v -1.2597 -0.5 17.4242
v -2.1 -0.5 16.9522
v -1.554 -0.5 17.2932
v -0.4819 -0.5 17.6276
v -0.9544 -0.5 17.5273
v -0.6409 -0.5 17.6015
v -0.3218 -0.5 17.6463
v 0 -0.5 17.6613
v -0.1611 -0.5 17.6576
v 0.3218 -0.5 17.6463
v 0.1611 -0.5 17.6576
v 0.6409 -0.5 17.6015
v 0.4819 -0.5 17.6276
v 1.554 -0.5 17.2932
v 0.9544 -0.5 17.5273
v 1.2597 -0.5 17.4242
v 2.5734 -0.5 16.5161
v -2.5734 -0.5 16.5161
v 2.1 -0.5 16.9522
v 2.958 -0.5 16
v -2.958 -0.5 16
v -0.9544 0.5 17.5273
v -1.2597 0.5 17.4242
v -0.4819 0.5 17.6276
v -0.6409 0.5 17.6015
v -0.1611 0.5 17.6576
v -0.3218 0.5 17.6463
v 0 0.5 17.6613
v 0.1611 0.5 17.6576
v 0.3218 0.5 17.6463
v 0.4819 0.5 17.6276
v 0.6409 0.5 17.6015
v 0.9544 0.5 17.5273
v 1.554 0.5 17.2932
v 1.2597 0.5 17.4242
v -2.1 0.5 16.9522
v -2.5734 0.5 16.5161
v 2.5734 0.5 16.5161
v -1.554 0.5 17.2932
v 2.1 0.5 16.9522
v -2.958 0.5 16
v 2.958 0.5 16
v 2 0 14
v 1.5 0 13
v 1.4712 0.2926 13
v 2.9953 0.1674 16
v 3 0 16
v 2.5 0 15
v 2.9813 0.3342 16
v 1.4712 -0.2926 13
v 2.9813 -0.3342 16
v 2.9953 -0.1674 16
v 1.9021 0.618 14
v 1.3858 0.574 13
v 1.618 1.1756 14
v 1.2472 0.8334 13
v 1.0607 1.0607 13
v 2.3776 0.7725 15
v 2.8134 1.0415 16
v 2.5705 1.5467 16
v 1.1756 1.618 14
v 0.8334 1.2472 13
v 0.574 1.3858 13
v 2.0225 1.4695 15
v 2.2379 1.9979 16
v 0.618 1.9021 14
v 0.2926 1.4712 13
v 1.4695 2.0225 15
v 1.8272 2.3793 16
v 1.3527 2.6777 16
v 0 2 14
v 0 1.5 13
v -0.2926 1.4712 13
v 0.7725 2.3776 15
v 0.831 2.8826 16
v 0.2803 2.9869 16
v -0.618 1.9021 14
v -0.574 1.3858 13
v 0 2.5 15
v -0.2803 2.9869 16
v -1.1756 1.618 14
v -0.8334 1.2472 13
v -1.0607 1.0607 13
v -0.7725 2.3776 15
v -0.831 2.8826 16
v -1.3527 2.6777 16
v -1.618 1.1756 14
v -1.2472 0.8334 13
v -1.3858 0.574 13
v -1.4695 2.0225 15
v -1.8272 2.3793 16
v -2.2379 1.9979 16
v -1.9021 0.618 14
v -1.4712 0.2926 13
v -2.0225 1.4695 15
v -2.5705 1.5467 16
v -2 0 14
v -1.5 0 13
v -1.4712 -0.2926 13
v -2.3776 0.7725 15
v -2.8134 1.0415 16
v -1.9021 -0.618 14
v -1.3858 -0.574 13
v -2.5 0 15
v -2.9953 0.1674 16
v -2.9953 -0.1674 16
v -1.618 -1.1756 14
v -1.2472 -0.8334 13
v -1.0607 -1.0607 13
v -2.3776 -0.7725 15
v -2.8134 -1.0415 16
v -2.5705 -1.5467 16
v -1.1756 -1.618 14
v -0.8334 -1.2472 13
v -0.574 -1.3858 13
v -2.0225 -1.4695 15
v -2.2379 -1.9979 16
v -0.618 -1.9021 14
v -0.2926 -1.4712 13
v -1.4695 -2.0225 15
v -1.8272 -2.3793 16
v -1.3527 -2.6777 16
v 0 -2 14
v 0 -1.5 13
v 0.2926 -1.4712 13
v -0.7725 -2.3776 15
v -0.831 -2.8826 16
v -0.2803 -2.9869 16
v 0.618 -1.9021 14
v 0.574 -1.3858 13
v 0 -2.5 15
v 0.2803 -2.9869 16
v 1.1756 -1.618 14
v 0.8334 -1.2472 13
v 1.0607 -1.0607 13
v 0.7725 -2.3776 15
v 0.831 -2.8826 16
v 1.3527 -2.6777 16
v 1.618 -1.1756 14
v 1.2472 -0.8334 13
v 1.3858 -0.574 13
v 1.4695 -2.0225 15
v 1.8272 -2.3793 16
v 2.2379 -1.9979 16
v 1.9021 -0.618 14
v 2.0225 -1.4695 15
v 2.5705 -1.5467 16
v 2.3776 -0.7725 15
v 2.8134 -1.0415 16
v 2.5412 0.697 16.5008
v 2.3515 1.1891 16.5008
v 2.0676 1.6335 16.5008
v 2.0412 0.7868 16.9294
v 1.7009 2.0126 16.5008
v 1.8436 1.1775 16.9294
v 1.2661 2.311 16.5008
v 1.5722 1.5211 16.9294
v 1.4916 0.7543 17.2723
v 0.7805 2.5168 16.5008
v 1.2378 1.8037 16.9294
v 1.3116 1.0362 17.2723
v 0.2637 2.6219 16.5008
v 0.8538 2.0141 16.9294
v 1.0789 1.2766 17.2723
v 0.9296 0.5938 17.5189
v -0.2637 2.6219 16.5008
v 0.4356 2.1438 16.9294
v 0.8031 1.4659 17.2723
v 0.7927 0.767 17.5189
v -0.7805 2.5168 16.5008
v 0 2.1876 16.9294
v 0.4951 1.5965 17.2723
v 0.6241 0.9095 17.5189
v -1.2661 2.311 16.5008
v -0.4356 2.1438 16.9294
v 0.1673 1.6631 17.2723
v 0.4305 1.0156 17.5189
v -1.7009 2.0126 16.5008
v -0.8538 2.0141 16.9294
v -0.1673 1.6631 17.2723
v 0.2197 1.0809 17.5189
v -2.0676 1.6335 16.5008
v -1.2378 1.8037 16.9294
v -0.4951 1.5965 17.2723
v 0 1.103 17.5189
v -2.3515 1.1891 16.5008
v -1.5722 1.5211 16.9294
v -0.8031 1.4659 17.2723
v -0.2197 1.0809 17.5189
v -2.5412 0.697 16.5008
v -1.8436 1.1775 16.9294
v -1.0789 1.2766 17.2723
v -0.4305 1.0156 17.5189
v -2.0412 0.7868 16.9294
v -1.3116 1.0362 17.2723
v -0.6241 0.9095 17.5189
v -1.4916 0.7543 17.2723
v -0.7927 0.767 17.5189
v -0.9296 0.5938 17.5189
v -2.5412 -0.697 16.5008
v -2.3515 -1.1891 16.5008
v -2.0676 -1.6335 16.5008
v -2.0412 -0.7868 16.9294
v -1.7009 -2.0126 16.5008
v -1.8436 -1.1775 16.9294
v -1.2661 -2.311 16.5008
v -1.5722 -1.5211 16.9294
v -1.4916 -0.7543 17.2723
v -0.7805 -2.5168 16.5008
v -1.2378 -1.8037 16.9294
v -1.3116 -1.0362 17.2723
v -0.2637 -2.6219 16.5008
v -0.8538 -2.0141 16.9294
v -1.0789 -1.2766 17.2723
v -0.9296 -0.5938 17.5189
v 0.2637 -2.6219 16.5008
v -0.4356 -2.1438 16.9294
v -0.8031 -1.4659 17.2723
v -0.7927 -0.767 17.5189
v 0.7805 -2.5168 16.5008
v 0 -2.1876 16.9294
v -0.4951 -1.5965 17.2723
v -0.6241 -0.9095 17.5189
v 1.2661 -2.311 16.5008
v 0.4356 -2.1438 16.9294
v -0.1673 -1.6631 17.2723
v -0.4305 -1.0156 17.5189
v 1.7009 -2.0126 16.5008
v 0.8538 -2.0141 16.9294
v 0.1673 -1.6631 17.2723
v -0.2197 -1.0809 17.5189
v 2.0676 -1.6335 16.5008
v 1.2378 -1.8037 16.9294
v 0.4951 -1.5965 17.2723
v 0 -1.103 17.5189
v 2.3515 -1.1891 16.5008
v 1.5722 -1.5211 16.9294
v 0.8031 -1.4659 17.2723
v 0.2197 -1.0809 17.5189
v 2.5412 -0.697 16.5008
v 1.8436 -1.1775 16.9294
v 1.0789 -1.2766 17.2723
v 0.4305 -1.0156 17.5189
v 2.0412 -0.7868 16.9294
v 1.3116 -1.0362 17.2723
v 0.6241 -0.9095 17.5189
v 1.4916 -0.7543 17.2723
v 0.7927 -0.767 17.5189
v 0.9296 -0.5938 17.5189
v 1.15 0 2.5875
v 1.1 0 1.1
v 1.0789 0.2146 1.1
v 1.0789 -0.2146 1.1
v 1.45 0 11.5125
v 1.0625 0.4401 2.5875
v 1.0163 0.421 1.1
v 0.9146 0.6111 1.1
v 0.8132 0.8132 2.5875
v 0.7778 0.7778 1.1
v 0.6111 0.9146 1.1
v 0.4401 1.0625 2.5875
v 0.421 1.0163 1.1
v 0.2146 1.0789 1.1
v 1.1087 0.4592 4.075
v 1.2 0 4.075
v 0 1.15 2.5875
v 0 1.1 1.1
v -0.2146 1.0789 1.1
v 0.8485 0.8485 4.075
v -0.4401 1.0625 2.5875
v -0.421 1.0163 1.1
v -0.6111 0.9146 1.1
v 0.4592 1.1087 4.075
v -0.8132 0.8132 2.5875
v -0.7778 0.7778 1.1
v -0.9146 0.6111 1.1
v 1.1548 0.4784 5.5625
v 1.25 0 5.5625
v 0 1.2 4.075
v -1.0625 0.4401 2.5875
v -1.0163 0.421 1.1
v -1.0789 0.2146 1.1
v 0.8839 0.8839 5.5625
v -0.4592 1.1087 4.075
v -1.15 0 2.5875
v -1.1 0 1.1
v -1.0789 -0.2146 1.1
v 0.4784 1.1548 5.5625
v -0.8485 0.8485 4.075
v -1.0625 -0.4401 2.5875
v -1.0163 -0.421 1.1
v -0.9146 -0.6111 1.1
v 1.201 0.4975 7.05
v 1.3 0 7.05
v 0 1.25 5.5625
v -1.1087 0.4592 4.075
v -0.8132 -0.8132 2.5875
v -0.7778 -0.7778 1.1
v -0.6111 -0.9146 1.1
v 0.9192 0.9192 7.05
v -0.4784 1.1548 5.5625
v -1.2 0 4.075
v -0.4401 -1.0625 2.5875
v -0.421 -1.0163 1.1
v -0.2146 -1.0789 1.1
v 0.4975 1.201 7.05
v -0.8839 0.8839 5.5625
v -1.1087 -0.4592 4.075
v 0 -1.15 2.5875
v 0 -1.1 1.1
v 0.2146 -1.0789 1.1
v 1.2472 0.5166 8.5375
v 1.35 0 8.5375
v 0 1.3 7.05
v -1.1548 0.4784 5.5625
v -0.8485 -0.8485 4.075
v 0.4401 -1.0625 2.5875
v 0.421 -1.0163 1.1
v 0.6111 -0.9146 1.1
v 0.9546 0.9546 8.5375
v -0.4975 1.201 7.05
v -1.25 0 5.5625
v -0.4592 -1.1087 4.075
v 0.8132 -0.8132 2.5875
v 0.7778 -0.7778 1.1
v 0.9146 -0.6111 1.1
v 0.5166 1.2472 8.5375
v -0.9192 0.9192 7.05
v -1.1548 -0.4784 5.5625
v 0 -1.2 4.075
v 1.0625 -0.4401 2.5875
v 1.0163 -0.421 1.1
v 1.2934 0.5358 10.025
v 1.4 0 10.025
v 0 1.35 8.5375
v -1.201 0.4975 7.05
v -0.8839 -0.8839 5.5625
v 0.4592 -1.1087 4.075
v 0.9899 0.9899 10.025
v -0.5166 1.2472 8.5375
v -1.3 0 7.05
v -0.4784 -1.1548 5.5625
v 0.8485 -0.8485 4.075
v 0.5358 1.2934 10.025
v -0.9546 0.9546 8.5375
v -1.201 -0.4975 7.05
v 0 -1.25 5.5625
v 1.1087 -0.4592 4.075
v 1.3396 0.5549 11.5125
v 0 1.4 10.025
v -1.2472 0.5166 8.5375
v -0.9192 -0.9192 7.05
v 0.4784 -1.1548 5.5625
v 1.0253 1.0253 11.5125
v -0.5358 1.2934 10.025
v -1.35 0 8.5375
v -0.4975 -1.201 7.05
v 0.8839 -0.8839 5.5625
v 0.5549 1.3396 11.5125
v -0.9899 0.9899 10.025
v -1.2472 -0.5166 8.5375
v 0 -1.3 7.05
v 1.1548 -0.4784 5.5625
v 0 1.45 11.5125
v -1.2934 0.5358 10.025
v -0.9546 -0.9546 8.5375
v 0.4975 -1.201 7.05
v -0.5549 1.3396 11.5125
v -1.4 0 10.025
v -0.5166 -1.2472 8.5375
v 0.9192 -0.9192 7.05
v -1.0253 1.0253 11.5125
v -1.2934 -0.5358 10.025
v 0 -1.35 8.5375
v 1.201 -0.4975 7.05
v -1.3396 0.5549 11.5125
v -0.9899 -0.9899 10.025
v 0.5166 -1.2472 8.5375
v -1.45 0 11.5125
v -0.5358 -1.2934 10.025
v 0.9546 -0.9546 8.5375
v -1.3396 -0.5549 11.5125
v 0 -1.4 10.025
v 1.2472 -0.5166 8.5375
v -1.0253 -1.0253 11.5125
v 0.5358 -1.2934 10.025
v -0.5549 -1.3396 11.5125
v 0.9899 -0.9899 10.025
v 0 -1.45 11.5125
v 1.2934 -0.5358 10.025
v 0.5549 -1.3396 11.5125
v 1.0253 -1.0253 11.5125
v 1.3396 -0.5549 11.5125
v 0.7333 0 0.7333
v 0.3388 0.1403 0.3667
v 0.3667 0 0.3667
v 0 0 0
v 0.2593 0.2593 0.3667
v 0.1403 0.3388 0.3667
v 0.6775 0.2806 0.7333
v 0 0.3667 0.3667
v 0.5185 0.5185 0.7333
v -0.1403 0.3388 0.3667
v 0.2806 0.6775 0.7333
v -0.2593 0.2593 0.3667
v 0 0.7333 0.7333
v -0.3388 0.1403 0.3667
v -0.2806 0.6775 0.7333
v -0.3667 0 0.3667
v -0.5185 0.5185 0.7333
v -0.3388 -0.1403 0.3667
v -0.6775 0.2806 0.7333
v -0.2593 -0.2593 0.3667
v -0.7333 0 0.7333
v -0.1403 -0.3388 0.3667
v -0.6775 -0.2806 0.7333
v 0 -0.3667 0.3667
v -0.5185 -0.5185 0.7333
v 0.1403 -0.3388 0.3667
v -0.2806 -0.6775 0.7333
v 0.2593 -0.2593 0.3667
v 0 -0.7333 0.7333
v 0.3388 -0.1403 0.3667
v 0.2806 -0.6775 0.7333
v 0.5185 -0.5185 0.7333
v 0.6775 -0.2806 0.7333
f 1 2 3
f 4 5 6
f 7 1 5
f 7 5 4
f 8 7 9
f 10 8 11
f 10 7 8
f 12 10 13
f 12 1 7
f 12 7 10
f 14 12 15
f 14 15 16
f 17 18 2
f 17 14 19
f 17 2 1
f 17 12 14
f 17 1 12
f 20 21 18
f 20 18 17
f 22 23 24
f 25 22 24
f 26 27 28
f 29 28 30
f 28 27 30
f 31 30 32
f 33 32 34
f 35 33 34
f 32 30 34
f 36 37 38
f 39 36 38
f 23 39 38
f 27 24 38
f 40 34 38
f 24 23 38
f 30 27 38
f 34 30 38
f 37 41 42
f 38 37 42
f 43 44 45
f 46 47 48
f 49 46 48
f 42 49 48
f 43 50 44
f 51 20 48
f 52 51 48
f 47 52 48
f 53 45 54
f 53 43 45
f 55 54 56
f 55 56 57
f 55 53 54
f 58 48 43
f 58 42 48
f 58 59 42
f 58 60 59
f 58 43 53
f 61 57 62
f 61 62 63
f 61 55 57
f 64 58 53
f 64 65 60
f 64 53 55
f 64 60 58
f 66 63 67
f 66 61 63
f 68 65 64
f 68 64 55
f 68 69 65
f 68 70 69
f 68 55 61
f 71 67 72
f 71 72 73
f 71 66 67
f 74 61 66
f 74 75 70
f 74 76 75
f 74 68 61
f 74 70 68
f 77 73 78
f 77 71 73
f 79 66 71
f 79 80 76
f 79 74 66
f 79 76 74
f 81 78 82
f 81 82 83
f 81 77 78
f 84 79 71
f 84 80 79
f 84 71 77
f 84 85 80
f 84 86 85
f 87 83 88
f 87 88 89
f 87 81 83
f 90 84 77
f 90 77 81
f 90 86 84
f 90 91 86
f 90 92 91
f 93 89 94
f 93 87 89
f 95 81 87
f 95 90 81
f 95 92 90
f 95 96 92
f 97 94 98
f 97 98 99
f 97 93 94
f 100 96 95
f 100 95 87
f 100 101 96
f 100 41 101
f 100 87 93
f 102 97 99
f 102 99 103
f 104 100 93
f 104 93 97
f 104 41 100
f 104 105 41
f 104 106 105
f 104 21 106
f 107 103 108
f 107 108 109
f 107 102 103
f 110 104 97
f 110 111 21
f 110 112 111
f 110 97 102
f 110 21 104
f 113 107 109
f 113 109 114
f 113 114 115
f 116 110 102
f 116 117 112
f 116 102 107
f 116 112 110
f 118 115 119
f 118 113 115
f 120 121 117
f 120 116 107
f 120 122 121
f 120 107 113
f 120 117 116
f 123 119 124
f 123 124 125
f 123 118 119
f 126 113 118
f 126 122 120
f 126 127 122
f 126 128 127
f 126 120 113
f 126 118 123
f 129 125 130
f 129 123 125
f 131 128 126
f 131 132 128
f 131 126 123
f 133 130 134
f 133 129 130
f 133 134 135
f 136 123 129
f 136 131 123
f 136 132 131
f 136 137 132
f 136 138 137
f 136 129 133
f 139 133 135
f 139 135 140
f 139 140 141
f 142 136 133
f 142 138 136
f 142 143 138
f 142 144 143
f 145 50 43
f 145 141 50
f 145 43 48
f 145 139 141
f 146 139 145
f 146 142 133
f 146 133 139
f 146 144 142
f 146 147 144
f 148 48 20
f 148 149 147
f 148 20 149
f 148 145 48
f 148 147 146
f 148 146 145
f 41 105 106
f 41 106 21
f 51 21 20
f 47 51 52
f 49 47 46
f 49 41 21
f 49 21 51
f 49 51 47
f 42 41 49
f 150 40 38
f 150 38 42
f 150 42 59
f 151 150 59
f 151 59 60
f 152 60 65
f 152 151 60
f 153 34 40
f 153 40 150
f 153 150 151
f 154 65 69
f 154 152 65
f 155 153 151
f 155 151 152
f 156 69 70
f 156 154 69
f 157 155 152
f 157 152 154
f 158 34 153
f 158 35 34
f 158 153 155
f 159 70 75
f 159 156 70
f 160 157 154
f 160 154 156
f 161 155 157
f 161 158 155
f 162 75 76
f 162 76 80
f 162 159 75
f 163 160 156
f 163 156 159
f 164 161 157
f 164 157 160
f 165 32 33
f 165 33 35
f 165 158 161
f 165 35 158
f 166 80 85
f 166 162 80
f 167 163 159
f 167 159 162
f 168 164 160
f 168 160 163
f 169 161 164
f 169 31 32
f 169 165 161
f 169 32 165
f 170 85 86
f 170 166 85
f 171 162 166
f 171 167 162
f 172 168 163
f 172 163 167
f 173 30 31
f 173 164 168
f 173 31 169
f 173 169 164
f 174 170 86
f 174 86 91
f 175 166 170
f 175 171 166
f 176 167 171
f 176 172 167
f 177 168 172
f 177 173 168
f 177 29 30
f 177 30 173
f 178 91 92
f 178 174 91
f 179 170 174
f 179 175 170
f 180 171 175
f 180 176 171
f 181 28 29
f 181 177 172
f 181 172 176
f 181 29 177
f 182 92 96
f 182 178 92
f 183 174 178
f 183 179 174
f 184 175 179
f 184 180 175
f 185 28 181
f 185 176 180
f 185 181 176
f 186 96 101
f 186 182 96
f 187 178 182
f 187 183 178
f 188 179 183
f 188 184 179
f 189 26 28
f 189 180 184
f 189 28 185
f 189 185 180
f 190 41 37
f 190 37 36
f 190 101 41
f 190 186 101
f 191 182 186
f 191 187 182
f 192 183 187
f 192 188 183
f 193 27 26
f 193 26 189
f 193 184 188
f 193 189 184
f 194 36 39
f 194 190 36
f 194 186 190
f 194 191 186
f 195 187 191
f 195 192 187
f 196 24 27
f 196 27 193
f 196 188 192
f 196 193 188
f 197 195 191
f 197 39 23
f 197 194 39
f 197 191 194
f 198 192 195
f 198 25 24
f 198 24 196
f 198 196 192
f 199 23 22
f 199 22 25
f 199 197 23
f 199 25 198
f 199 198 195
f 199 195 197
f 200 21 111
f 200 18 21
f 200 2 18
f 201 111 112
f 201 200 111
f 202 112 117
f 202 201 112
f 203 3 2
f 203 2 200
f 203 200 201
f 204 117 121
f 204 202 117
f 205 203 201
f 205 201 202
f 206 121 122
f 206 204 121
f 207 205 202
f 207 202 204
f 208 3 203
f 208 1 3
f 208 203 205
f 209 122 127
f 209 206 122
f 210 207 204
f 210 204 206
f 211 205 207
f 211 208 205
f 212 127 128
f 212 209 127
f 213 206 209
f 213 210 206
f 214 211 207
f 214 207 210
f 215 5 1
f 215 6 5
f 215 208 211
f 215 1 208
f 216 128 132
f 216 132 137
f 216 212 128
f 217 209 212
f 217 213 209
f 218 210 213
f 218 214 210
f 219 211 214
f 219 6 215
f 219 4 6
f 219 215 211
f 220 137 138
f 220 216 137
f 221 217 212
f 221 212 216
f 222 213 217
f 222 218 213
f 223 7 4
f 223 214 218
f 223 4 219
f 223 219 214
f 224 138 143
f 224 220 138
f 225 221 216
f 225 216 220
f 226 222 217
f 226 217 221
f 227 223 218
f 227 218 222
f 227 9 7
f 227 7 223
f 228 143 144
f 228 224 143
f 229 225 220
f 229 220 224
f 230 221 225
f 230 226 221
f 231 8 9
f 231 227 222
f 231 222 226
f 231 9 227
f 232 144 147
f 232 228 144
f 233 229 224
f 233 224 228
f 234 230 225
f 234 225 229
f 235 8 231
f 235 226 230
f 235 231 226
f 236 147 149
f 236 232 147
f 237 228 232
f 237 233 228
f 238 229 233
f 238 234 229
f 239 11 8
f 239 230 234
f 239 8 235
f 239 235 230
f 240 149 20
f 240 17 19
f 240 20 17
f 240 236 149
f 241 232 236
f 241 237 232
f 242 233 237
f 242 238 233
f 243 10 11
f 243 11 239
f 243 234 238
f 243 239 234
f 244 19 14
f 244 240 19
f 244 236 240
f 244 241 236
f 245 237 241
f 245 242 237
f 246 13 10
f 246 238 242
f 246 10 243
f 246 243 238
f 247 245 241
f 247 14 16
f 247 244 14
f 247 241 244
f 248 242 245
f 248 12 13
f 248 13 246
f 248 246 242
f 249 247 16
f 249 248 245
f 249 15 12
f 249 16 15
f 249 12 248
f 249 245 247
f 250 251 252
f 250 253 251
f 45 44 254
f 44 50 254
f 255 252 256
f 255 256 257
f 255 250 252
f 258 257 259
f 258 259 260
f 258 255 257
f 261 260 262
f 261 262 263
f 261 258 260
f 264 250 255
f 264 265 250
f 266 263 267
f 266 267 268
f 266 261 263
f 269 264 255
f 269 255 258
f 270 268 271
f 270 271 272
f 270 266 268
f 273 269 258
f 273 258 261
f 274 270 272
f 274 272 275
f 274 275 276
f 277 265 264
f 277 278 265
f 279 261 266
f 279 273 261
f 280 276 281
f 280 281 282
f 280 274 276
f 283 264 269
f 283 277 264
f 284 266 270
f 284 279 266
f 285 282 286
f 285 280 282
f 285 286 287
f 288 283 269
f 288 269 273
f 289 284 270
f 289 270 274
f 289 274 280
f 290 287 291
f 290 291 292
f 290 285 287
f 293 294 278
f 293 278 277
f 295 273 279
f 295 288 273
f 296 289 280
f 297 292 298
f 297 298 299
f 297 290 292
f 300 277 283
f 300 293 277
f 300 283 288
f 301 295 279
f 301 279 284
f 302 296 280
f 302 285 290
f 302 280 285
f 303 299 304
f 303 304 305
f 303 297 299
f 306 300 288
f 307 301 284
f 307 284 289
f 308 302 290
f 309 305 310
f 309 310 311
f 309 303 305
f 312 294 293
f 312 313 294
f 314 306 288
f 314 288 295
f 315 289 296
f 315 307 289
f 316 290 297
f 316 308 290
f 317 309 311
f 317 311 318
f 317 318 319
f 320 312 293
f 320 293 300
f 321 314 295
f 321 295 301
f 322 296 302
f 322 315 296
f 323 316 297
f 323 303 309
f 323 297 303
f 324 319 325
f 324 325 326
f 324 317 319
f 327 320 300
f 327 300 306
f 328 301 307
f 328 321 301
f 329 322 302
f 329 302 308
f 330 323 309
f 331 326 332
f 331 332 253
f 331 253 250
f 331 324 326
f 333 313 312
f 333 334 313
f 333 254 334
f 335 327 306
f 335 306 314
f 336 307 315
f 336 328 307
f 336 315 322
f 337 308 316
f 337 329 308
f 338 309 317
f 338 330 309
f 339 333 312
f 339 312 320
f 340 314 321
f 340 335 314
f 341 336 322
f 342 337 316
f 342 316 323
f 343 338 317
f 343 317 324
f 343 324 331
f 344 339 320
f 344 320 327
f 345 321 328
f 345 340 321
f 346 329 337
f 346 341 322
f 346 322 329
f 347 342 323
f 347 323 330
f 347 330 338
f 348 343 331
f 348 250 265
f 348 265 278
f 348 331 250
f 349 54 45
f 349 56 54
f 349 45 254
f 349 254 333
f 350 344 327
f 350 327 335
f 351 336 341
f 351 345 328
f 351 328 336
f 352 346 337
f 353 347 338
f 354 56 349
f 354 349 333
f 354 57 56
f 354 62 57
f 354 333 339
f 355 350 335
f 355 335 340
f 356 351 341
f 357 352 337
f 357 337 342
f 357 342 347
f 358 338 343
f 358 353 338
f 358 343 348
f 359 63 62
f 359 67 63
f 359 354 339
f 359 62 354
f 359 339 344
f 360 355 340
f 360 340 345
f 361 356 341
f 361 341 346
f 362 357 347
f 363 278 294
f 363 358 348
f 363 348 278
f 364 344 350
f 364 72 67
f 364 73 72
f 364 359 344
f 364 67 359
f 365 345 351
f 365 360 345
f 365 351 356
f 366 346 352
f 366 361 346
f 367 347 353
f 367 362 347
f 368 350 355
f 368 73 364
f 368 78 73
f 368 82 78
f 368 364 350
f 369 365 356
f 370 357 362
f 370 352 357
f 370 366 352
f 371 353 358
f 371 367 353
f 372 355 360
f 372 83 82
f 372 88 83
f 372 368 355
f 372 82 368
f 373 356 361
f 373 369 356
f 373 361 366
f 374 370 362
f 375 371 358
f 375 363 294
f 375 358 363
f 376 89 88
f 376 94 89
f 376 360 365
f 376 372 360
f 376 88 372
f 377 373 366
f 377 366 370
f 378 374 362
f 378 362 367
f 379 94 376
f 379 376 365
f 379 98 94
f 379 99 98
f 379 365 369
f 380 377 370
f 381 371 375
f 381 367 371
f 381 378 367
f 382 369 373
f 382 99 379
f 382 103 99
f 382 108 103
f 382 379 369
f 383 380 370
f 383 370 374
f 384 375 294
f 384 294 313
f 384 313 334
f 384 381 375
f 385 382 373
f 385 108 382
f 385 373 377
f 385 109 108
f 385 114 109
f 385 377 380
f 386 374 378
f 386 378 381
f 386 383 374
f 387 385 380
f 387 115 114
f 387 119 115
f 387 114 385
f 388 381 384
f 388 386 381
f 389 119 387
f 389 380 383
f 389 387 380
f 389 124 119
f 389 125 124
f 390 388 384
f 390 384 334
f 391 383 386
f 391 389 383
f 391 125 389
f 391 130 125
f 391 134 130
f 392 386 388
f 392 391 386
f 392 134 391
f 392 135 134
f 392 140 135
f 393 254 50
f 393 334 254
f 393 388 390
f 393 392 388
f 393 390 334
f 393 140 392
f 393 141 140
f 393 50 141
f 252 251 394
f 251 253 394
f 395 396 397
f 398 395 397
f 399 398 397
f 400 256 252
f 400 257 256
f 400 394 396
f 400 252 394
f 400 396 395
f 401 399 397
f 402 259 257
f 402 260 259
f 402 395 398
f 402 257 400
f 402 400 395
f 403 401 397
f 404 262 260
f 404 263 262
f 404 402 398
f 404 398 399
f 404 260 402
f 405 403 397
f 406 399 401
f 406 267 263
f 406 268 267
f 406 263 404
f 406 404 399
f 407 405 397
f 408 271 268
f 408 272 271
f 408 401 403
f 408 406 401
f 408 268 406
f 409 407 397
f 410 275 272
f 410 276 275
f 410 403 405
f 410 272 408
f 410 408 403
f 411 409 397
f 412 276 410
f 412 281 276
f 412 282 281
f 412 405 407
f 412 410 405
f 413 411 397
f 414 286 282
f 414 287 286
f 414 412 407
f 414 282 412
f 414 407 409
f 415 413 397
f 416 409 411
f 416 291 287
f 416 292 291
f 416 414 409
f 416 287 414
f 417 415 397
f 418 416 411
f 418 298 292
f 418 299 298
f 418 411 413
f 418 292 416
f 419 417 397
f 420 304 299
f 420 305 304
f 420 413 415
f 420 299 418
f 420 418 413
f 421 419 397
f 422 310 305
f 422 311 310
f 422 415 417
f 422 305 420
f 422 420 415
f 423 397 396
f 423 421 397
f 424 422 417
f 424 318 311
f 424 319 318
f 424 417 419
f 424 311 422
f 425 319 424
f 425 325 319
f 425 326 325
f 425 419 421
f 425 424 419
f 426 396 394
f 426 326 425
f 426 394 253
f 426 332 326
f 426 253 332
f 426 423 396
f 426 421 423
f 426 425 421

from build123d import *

# Parameters (mm, degrees)
F3_W     = 8
F3_H     = 1
F4_DEPTH = 2.4


with BuildPart() as f1:
    # F0 (on Front) → F1 (revolve)
    with BuildSketch(Plane.XZ):
        with BuildLine():
            Line((0, 17.697224), (0, 0))
            Line((0, 0), (1.1, 1.1))
            Line((1.1, 1.1), (1.5, 13))
            Line((1.5, 13), (3, 16))
            ThreePointArc((3, 16), (1.72341, 17.24351), (0, 17.697224))
        make_face()
    revolve(axis=Axis((0, 0, 8.848612), (0, 0, 1)))

    # F3 (on offset) → F4 (cut)
    with BuildSketch(Plane.XY.offset(16)):
        Rectangle(F3_W, F3_H)
    extrude(amount=F4_DEPTH, mode=Mode.SUBTRACT)


solid = f1.part
